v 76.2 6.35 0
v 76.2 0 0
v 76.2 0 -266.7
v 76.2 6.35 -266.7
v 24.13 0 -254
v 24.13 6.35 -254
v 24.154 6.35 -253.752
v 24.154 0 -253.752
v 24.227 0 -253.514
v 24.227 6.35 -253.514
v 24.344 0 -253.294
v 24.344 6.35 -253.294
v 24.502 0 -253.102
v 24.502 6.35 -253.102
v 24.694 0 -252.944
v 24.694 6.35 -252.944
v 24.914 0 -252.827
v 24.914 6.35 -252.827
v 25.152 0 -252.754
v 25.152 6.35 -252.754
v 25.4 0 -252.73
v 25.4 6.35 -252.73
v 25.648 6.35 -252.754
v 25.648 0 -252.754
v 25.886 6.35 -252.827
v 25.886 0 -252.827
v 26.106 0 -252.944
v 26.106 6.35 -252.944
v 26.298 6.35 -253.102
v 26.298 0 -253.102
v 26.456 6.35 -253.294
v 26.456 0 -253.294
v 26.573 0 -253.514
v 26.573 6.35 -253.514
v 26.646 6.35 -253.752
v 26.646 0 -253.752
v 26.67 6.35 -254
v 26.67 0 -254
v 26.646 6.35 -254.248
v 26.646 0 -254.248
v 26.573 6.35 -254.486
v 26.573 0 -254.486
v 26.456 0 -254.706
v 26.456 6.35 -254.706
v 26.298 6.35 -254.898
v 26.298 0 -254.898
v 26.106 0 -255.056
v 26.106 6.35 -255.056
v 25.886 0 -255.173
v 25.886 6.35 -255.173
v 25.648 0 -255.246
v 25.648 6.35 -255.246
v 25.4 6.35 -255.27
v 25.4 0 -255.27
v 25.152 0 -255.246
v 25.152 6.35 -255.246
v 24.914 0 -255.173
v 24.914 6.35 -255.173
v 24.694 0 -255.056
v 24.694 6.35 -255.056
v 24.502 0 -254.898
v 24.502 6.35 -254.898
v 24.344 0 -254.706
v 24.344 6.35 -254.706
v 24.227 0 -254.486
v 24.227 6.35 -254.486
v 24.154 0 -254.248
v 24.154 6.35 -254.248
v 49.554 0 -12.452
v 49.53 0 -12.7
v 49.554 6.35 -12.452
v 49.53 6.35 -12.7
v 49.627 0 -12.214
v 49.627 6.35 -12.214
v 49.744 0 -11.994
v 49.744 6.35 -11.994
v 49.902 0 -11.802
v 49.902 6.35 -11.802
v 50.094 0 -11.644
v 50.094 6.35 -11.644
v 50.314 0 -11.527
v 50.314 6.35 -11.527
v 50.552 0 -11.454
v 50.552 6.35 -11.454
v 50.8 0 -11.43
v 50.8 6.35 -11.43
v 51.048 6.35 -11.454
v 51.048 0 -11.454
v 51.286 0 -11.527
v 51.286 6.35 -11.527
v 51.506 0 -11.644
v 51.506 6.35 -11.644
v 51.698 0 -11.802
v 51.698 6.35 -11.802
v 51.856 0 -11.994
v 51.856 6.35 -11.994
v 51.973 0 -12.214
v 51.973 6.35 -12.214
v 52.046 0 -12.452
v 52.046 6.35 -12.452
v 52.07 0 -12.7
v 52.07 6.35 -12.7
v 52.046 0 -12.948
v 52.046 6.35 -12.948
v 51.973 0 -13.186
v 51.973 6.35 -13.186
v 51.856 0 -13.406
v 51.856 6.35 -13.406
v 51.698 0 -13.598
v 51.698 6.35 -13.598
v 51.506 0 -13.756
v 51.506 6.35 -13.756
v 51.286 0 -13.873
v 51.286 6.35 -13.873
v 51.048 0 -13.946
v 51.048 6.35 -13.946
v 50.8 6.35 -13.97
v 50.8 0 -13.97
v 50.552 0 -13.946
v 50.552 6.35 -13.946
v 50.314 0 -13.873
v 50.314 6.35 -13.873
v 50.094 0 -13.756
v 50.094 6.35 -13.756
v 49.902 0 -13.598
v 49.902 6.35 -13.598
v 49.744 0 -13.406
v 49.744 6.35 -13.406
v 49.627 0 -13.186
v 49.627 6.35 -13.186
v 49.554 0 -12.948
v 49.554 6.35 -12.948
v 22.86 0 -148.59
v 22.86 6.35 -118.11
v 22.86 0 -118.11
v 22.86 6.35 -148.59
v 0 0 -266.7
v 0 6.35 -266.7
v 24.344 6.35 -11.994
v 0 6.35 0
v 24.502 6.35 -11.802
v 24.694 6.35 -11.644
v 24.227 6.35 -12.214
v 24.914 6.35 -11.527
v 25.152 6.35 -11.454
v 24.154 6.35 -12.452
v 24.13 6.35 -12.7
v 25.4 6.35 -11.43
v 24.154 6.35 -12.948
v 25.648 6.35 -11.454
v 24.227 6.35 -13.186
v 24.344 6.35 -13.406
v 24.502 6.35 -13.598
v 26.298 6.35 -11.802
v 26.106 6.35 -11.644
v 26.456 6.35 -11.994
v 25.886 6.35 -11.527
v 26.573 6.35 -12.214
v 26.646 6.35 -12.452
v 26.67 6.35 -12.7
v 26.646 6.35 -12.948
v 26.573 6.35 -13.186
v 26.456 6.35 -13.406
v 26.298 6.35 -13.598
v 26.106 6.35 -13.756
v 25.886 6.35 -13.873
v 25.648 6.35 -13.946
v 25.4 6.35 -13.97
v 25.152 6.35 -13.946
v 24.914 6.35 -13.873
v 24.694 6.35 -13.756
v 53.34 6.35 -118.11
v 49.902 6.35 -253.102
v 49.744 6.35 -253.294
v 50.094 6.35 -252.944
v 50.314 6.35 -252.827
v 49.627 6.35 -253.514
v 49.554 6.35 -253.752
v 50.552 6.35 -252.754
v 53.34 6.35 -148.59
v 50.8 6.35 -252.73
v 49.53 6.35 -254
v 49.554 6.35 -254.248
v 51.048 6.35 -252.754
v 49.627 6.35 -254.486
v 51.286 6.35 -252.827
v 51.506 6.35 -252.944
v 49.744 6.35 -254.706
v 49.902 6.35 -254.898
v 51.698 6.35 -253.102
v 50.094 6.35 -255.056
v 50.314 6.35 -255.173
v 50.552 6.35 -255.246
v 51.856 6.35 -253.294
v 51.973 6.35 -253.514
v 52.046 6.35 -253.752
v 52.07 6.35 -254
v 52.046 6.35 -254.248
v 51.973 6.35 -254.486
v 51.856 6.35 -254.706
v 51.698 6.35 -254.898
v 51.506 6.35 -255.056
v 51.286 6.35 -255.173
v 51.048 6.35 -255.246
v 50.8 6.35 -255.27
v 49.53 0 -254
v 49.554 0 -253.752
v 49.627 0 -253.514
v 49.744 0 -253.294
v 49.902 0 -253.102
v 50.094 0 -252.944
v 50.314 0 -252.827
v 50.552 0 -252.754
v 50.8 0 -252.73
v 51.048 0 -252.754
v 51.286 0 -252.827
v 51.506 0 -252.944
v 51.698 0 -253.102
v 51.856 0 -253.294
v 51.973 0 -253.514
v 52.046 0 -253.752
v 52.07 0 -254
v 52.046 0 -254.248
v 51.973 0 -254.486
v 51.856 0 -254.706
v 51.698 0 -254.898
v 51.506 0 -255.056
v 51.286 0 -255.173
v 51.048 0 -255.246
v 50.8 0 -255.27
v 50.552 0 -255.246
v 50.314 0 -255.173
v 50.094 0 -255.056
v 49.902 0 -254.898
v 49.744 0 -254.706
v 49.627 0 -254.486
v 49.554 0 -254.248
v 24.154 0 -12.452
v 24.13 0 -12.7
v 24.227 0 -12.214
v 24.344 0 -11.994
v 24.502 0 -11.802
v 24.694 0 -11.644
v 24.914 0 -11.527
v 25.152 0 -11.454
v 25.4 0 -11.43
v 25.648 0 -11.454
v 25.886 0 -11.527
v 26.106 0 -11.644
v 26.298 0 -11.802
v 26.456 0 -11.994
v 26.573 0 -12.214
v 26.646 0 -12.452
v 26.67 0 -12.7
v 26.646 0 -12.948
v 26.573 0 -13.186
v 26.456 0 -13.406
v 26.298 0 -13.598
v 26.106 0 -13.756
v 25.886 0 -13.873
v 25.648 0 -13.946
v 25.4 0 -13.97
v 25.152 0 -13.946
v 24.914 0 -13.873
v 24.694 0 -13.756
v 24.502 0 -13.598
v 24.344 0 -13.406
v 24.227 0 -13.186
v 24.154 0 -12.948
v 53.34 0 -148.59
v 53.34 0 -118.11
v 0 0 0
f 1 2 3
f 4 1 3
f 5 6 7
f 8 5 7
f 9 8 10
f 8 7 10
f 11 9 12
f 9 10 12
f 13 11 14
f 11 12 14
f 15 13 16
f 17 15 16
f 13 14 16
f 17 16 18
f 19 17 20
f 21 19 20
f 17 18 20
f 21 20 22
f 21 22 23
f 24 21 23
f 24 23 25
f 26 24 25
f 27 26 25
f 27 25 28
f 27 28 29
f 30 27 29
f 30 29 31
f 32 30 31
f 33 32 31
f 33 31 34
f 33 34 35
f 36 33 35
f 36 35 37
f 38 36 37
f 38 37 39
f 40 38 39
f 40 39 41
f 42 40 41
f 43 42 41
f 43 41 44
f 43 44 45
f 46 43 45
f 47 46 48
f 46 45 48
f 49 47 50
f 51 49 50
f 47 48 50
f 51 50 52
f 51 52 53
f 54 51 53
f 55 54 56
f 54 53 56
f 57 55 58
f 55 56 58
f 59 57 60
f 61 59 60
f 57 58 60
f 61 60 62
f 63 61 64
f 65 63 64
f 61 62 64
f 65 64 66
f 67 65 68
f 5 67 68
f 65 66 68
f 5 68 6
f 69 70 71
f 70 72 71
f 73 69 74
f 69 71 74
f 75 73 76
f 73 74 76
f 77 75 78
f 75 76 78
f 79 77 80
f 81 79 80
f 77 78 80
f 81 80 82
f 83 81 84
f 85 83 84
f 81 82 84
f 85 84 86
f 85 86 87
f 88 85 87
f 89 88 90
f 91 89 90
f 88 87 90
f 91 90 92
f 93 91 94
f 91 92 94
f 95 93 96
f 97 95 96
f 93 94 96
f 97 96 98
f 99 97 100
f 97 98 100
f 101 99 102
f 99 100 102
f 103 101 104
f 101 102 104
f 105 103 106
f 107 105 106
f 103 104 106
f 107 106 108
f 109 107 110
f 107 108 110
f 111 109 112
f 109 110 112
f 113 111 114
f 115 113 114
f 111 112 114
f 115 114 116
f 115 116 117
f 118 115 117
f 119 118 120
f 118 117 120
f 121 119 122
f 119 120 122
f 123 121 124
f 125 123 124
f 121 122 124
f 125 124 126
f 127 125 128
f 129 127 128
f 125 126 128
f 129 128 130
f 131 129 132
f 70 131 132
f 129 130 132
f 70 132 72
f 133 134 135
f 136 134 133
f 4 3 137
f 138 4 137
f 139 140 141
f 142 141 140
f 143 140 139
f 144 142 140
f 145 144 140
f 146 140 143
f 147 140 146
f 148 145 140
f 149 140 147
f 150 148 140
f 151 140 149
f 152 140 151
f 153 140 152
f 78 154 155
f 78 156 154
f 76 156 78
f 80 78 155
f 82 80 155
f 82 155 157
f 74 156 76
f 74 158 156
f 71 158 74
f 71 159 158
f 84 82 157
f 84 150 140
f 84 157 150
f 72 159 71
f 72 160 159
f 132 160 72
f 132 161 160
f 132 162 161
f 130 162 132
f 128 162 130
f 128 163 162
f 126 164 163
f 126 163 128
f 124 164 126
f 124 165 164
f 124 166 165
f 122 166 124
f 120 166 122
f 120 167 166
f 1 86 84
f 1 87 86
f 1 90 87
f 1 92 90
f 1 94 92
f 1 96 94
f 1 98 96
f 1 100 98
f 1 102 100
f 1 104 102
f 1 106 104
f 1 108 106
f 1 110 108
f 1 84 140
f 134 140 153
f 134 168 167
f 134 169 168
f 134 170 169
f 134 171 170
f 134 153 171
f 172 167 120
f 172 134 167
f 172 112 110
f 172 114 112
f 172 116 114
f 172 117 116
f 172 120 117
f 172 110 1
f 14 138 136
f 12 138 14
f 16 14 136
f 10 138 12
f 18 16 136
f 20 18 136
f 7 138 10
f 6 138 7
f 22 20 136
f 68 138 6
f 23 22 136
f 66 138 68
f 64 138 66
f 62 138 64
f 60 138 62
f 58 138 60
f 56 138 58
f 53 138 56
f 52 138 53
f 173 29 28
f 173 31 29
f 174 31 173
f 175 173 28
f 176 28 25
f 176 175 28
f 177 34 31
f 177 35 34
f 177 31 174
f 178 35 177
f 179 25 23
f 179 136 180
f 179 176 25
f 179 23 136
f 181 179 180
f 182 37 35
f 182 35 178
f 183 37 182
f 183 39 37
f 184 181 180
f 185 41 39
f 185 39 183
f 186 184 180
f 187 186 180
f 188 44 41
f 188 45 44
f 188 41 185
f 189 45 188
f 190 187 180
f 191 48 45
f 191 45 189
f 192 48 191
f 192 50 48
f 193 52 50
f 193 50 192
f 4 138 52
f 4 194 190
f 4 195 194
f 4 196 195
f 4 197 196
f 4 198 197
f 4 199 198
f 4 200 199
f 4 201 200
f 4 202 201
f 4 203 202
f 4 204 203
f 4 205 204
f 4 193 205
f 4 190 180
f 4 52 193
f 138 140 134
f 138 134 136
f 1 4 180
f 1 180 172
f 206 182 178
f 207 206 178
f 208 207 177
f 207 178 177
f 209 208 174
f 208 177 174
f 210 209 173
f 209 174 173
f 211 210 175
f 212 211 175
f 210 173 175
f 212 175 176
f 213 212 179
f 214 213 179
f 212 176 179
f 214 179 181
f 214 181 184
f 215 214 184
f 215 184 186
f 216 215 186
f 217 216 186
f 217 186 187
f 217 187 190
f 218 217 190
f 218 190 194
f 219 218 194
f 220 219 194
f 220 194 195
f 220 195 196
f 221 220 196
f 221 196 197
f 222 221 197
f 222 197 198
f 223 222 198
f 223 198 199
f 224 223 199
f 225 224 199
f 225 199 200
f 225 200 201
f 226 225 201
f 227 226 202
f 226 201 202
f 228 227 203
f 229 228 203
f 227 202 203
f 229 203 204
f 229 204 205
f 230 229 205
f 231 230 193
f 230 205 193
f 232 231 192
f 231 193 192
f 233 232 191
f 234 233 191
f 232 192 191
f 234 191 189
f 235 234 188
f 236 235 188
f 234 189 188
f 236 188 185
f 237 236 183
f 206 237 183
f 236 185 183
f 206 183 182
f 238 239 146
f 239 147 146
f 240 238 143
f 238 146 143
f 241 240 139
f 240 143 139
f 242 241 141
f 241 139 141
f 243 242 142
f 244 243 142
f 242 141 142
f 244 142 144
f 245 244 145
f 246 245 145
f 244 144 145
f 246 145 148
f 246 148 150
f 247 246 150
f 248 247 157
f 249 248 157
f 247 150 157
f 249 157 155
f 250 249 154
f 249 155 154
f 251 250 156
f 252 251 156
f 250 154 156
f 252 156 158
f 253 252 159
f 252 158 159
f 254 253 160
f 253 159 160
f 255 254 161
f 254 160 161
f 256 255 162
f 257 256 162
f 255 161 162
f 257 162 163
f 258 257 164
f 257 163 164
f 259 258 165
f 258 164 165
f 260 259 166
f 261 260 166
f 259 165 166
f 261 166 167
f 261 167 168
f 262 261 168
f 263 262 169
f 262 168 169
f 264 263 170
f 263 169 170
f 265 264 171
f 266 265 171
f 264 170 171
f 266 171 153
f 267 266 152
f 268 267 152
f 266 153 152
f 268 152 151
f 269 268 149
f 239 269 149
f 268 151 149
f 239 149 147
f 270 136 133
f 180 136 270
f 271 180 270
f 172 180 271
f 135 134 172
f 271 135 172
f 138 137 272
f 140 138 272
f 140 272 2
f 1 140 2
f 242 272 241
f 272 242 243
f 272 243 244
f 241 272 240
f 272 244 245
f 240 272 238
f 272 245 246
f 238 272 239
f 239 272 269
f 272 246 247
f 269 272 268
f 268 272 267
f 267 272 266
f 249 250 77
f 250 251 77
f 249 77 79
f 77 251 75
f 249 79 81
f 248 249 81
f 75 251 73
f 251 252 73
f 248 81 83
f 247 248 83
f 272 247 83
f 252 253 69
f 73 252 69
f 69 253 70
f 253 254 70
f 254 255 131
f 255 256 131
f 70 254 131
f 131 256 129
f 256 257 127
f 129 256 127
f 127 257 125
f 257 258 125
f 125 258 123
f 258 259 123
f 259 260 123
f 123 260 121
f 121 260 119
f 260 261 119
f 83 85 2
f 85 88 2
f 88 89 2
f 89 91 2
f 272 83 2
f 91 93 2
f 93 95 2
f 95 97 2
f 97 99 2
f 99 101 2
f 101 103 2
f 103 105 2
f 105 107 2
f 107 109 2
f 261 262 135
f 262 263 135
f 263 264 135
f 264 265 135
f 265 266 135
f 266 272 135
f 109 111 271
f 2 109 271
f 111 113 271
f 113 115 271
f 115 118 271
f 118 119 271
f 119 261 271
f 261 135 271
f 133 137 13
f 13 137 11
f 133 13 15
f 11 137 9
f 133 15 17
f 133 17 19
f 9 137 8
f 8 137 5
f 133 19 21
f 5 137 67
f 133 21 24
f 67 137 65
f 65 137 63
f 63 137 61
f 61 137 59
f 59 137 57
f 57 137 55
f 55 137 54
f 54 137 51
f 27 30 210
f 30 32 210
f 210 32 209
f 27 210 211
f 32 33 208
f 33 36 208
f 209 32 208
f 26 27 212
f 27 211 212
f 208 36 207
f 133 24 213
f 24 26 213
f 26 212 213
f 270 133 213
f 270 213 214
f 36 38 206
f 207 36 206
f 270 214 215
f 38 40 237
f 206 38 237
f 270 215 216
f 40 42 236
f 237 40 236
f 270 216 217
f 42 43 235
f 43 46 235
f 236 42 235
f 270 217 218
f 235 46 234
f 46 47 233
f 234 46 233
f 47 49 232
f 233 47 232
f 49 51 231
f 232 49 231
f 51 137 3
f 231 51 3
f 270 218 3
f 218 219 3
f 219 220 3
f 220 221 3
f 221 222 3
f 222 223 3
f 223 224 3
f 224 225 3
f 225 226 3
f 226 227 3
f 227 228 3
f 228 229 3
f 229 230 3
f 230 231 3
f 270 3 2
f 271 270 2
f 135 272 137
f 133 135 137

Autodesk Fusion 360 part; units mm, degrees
sketch "Sketch1" plane through (0, 0, 0) normal (0, 1, 0) x (1, 0, 0)
  line L0 (0, 0) -> (76.2, 0)
  line L1 (76.2, 0) -> (76.2, 266.7)
  line L2 (76.2, 266.7) -> (0, 266.7)
  line L3 (0, 266.7) -> (0, 0)
extrude "Extrude1" add sketch "Sketch1" along normal blind 6.35
sketch "Sketch2" plane through (0, 6.35, 0) normal (0, 1, 0) x (-1, 0, 0)
  line L0 (0, -266.7) -> (0, 0)
  line L1 (0, 0) -> (-76.2, 0)
  line L2 (-76.2, 0) -> (-76.2, -266.7)
  line L3 (-76.2, -266.7) -> (0, -266.7)
  circle A0 centre (-25.4, -12.7) radius 1.27
  dimension "d3" = 2.54
extrude "Extrude2" cut sketch "Sketch2" against normal blind 6.35 contours A0
sketch "Sketch3" plane through (0, 6.35, 0) normal (0, 1, 0) x (-1, 0, 0)
  circle A0 centre (-25.4, -12.7) radius 1.27
  line L0 (0, -266.7) -> (0, 0)
  line L1 (0, 0) -> (-76.2, 0)
  line L2 (-76.2, 0) -> (-76.2, -266.7)
  line L3 (-76.2, -266.7) -> (0, -266.7)
  circle A1 centre (-50.8, -12.7) radius 1.27
  circle A2 centre (-25.4, -254) radius 1.27
  circle A3 centre (-50.8, -254) radius 1.27
  dimension "d6" = 2.54
  dimension "d7" = 2.54
  dimension "d8" = 2.54
extrude "Extrude3" cut sketch "Sketch3" against normal blind 6.35 contours A1 | A2 | A3
sketch "Sketch4" plane through (0, 6.35, 0) normal (0, 1, 0) x (-1, 0, 0)
  circle A0 centre (-50.8, -12.7) radius 1.27
  circle A1 centre (-50.8, -254) radius 1.27
  circle A2 centre (-25.4, -254) radius 1.27
  circle A3 centre (-25.4, -12.7) radius 1.27
  line L0 (0, -266.7) -> (0, 0)
  line L1 (0, 0) -> (-76.2, 0)
  line L2 (-76.2, 0) -> (-76.2, -266.7)
  line L3 (-76.2, -266.7) -> (0, -266.7)
  line L4 (-25.4, -146.05) -> (-50.8, -146.05)
  line L5 (-50.8, -146.05) -> (-50.8, -120.65)
  line L6 (-50.8, -120.65) -> (-25.4, -120.65)
  line L7 (-25.4, -120.65) -> (-25.4, -146.05)
  dimension "d11" = 25.4
  dimension "d12" = 25.4
extrude "Extrude4" cut sketch "Sketch4" against normal blind 6.35 contours L4 L5 L6 L7
sketch "Sketch5" plane through (0, 6.35, 0) normal (0, 1, 0) x (-1, 0, 0)
  line L0 (-50.8, -146.05) -> (-50.8, -120.65)
  line L1 (-50.8, -120.65) -> (-25.4, -120.65)
  line L2 (-25.4, -120.65) -> (-25.4, -146.05)
  line L3 (-25.4, -146.05) -> (-50.8, -146.05)
  circle A0 centre (-50.8, -12.7) radius 1.27
  circle A1 centre (-50.8, -254) radius 1.27
  circle A2 centre (-25.4, -254) radius 1.27
  circle A3 centre (-25.4, -12.7) radius 1.27
  line L4 (0, -266.7) -> (0, 0)
  line L5 (0, 0) -> (-76.2, 0)
  line L6 (-76.2, 0) -> (-76.2, -266.7)
  line L7 (-76.2, -266.7) -> (0, -266.7)
  line L8 (-50.8, -146.05) -> (-53.34, -146.05)
  line L9 (-53.34, -146.05) -> (-53.34, -120.65)
  line L10 (-53.34, -120.65) -> (-50.8, -120.65)
  line L11 (-50.8, -120.65) -> (-50.8, -146.05)
  line L12 (-22.86, -148.59) -> (-53.34, -148.59)
  line L13 (-53.34, -148.59) -> (-53.34, -146.05)
  line L14 (-53.34, -146.05) -> (-22.86, -146.05)
  line L15 (-22.86, -146.05) -> (-22.86, -148.59)
  line L16 (-22.86, -146.05) -> (-25.4, -146.05)
  line L17 (-25.4, -146.05) -> (-25.4, -118.11)
  line L18 (-25.4, -118.11) -> (-22.86, -118.11)
  line L19 (-22.86, -118.11) -> (-22.86, -146.05)
  line L20 (-25.4, -118.11) -> (-53.34, -118.11)
  line L21 (-53.34, -118.11) -> (-53.34, -120.65)
  line L22 (-53.34, -120.65) -> (-25.4, -120.65)
  line L23 (-25.4, -120.65) -> (-25.4, -118.11)
extrude "Extrude5" cut sketch "Sketch5" against normal blind 6.35 contours L0 L8 L9 L10 L11 L14 L22 | L3 L8 L12 L13 L14 L15 L16 | L1 L10 L17 L20 L21 L22 L23 | L2 L14 L16 L17 L18 L19 L23
